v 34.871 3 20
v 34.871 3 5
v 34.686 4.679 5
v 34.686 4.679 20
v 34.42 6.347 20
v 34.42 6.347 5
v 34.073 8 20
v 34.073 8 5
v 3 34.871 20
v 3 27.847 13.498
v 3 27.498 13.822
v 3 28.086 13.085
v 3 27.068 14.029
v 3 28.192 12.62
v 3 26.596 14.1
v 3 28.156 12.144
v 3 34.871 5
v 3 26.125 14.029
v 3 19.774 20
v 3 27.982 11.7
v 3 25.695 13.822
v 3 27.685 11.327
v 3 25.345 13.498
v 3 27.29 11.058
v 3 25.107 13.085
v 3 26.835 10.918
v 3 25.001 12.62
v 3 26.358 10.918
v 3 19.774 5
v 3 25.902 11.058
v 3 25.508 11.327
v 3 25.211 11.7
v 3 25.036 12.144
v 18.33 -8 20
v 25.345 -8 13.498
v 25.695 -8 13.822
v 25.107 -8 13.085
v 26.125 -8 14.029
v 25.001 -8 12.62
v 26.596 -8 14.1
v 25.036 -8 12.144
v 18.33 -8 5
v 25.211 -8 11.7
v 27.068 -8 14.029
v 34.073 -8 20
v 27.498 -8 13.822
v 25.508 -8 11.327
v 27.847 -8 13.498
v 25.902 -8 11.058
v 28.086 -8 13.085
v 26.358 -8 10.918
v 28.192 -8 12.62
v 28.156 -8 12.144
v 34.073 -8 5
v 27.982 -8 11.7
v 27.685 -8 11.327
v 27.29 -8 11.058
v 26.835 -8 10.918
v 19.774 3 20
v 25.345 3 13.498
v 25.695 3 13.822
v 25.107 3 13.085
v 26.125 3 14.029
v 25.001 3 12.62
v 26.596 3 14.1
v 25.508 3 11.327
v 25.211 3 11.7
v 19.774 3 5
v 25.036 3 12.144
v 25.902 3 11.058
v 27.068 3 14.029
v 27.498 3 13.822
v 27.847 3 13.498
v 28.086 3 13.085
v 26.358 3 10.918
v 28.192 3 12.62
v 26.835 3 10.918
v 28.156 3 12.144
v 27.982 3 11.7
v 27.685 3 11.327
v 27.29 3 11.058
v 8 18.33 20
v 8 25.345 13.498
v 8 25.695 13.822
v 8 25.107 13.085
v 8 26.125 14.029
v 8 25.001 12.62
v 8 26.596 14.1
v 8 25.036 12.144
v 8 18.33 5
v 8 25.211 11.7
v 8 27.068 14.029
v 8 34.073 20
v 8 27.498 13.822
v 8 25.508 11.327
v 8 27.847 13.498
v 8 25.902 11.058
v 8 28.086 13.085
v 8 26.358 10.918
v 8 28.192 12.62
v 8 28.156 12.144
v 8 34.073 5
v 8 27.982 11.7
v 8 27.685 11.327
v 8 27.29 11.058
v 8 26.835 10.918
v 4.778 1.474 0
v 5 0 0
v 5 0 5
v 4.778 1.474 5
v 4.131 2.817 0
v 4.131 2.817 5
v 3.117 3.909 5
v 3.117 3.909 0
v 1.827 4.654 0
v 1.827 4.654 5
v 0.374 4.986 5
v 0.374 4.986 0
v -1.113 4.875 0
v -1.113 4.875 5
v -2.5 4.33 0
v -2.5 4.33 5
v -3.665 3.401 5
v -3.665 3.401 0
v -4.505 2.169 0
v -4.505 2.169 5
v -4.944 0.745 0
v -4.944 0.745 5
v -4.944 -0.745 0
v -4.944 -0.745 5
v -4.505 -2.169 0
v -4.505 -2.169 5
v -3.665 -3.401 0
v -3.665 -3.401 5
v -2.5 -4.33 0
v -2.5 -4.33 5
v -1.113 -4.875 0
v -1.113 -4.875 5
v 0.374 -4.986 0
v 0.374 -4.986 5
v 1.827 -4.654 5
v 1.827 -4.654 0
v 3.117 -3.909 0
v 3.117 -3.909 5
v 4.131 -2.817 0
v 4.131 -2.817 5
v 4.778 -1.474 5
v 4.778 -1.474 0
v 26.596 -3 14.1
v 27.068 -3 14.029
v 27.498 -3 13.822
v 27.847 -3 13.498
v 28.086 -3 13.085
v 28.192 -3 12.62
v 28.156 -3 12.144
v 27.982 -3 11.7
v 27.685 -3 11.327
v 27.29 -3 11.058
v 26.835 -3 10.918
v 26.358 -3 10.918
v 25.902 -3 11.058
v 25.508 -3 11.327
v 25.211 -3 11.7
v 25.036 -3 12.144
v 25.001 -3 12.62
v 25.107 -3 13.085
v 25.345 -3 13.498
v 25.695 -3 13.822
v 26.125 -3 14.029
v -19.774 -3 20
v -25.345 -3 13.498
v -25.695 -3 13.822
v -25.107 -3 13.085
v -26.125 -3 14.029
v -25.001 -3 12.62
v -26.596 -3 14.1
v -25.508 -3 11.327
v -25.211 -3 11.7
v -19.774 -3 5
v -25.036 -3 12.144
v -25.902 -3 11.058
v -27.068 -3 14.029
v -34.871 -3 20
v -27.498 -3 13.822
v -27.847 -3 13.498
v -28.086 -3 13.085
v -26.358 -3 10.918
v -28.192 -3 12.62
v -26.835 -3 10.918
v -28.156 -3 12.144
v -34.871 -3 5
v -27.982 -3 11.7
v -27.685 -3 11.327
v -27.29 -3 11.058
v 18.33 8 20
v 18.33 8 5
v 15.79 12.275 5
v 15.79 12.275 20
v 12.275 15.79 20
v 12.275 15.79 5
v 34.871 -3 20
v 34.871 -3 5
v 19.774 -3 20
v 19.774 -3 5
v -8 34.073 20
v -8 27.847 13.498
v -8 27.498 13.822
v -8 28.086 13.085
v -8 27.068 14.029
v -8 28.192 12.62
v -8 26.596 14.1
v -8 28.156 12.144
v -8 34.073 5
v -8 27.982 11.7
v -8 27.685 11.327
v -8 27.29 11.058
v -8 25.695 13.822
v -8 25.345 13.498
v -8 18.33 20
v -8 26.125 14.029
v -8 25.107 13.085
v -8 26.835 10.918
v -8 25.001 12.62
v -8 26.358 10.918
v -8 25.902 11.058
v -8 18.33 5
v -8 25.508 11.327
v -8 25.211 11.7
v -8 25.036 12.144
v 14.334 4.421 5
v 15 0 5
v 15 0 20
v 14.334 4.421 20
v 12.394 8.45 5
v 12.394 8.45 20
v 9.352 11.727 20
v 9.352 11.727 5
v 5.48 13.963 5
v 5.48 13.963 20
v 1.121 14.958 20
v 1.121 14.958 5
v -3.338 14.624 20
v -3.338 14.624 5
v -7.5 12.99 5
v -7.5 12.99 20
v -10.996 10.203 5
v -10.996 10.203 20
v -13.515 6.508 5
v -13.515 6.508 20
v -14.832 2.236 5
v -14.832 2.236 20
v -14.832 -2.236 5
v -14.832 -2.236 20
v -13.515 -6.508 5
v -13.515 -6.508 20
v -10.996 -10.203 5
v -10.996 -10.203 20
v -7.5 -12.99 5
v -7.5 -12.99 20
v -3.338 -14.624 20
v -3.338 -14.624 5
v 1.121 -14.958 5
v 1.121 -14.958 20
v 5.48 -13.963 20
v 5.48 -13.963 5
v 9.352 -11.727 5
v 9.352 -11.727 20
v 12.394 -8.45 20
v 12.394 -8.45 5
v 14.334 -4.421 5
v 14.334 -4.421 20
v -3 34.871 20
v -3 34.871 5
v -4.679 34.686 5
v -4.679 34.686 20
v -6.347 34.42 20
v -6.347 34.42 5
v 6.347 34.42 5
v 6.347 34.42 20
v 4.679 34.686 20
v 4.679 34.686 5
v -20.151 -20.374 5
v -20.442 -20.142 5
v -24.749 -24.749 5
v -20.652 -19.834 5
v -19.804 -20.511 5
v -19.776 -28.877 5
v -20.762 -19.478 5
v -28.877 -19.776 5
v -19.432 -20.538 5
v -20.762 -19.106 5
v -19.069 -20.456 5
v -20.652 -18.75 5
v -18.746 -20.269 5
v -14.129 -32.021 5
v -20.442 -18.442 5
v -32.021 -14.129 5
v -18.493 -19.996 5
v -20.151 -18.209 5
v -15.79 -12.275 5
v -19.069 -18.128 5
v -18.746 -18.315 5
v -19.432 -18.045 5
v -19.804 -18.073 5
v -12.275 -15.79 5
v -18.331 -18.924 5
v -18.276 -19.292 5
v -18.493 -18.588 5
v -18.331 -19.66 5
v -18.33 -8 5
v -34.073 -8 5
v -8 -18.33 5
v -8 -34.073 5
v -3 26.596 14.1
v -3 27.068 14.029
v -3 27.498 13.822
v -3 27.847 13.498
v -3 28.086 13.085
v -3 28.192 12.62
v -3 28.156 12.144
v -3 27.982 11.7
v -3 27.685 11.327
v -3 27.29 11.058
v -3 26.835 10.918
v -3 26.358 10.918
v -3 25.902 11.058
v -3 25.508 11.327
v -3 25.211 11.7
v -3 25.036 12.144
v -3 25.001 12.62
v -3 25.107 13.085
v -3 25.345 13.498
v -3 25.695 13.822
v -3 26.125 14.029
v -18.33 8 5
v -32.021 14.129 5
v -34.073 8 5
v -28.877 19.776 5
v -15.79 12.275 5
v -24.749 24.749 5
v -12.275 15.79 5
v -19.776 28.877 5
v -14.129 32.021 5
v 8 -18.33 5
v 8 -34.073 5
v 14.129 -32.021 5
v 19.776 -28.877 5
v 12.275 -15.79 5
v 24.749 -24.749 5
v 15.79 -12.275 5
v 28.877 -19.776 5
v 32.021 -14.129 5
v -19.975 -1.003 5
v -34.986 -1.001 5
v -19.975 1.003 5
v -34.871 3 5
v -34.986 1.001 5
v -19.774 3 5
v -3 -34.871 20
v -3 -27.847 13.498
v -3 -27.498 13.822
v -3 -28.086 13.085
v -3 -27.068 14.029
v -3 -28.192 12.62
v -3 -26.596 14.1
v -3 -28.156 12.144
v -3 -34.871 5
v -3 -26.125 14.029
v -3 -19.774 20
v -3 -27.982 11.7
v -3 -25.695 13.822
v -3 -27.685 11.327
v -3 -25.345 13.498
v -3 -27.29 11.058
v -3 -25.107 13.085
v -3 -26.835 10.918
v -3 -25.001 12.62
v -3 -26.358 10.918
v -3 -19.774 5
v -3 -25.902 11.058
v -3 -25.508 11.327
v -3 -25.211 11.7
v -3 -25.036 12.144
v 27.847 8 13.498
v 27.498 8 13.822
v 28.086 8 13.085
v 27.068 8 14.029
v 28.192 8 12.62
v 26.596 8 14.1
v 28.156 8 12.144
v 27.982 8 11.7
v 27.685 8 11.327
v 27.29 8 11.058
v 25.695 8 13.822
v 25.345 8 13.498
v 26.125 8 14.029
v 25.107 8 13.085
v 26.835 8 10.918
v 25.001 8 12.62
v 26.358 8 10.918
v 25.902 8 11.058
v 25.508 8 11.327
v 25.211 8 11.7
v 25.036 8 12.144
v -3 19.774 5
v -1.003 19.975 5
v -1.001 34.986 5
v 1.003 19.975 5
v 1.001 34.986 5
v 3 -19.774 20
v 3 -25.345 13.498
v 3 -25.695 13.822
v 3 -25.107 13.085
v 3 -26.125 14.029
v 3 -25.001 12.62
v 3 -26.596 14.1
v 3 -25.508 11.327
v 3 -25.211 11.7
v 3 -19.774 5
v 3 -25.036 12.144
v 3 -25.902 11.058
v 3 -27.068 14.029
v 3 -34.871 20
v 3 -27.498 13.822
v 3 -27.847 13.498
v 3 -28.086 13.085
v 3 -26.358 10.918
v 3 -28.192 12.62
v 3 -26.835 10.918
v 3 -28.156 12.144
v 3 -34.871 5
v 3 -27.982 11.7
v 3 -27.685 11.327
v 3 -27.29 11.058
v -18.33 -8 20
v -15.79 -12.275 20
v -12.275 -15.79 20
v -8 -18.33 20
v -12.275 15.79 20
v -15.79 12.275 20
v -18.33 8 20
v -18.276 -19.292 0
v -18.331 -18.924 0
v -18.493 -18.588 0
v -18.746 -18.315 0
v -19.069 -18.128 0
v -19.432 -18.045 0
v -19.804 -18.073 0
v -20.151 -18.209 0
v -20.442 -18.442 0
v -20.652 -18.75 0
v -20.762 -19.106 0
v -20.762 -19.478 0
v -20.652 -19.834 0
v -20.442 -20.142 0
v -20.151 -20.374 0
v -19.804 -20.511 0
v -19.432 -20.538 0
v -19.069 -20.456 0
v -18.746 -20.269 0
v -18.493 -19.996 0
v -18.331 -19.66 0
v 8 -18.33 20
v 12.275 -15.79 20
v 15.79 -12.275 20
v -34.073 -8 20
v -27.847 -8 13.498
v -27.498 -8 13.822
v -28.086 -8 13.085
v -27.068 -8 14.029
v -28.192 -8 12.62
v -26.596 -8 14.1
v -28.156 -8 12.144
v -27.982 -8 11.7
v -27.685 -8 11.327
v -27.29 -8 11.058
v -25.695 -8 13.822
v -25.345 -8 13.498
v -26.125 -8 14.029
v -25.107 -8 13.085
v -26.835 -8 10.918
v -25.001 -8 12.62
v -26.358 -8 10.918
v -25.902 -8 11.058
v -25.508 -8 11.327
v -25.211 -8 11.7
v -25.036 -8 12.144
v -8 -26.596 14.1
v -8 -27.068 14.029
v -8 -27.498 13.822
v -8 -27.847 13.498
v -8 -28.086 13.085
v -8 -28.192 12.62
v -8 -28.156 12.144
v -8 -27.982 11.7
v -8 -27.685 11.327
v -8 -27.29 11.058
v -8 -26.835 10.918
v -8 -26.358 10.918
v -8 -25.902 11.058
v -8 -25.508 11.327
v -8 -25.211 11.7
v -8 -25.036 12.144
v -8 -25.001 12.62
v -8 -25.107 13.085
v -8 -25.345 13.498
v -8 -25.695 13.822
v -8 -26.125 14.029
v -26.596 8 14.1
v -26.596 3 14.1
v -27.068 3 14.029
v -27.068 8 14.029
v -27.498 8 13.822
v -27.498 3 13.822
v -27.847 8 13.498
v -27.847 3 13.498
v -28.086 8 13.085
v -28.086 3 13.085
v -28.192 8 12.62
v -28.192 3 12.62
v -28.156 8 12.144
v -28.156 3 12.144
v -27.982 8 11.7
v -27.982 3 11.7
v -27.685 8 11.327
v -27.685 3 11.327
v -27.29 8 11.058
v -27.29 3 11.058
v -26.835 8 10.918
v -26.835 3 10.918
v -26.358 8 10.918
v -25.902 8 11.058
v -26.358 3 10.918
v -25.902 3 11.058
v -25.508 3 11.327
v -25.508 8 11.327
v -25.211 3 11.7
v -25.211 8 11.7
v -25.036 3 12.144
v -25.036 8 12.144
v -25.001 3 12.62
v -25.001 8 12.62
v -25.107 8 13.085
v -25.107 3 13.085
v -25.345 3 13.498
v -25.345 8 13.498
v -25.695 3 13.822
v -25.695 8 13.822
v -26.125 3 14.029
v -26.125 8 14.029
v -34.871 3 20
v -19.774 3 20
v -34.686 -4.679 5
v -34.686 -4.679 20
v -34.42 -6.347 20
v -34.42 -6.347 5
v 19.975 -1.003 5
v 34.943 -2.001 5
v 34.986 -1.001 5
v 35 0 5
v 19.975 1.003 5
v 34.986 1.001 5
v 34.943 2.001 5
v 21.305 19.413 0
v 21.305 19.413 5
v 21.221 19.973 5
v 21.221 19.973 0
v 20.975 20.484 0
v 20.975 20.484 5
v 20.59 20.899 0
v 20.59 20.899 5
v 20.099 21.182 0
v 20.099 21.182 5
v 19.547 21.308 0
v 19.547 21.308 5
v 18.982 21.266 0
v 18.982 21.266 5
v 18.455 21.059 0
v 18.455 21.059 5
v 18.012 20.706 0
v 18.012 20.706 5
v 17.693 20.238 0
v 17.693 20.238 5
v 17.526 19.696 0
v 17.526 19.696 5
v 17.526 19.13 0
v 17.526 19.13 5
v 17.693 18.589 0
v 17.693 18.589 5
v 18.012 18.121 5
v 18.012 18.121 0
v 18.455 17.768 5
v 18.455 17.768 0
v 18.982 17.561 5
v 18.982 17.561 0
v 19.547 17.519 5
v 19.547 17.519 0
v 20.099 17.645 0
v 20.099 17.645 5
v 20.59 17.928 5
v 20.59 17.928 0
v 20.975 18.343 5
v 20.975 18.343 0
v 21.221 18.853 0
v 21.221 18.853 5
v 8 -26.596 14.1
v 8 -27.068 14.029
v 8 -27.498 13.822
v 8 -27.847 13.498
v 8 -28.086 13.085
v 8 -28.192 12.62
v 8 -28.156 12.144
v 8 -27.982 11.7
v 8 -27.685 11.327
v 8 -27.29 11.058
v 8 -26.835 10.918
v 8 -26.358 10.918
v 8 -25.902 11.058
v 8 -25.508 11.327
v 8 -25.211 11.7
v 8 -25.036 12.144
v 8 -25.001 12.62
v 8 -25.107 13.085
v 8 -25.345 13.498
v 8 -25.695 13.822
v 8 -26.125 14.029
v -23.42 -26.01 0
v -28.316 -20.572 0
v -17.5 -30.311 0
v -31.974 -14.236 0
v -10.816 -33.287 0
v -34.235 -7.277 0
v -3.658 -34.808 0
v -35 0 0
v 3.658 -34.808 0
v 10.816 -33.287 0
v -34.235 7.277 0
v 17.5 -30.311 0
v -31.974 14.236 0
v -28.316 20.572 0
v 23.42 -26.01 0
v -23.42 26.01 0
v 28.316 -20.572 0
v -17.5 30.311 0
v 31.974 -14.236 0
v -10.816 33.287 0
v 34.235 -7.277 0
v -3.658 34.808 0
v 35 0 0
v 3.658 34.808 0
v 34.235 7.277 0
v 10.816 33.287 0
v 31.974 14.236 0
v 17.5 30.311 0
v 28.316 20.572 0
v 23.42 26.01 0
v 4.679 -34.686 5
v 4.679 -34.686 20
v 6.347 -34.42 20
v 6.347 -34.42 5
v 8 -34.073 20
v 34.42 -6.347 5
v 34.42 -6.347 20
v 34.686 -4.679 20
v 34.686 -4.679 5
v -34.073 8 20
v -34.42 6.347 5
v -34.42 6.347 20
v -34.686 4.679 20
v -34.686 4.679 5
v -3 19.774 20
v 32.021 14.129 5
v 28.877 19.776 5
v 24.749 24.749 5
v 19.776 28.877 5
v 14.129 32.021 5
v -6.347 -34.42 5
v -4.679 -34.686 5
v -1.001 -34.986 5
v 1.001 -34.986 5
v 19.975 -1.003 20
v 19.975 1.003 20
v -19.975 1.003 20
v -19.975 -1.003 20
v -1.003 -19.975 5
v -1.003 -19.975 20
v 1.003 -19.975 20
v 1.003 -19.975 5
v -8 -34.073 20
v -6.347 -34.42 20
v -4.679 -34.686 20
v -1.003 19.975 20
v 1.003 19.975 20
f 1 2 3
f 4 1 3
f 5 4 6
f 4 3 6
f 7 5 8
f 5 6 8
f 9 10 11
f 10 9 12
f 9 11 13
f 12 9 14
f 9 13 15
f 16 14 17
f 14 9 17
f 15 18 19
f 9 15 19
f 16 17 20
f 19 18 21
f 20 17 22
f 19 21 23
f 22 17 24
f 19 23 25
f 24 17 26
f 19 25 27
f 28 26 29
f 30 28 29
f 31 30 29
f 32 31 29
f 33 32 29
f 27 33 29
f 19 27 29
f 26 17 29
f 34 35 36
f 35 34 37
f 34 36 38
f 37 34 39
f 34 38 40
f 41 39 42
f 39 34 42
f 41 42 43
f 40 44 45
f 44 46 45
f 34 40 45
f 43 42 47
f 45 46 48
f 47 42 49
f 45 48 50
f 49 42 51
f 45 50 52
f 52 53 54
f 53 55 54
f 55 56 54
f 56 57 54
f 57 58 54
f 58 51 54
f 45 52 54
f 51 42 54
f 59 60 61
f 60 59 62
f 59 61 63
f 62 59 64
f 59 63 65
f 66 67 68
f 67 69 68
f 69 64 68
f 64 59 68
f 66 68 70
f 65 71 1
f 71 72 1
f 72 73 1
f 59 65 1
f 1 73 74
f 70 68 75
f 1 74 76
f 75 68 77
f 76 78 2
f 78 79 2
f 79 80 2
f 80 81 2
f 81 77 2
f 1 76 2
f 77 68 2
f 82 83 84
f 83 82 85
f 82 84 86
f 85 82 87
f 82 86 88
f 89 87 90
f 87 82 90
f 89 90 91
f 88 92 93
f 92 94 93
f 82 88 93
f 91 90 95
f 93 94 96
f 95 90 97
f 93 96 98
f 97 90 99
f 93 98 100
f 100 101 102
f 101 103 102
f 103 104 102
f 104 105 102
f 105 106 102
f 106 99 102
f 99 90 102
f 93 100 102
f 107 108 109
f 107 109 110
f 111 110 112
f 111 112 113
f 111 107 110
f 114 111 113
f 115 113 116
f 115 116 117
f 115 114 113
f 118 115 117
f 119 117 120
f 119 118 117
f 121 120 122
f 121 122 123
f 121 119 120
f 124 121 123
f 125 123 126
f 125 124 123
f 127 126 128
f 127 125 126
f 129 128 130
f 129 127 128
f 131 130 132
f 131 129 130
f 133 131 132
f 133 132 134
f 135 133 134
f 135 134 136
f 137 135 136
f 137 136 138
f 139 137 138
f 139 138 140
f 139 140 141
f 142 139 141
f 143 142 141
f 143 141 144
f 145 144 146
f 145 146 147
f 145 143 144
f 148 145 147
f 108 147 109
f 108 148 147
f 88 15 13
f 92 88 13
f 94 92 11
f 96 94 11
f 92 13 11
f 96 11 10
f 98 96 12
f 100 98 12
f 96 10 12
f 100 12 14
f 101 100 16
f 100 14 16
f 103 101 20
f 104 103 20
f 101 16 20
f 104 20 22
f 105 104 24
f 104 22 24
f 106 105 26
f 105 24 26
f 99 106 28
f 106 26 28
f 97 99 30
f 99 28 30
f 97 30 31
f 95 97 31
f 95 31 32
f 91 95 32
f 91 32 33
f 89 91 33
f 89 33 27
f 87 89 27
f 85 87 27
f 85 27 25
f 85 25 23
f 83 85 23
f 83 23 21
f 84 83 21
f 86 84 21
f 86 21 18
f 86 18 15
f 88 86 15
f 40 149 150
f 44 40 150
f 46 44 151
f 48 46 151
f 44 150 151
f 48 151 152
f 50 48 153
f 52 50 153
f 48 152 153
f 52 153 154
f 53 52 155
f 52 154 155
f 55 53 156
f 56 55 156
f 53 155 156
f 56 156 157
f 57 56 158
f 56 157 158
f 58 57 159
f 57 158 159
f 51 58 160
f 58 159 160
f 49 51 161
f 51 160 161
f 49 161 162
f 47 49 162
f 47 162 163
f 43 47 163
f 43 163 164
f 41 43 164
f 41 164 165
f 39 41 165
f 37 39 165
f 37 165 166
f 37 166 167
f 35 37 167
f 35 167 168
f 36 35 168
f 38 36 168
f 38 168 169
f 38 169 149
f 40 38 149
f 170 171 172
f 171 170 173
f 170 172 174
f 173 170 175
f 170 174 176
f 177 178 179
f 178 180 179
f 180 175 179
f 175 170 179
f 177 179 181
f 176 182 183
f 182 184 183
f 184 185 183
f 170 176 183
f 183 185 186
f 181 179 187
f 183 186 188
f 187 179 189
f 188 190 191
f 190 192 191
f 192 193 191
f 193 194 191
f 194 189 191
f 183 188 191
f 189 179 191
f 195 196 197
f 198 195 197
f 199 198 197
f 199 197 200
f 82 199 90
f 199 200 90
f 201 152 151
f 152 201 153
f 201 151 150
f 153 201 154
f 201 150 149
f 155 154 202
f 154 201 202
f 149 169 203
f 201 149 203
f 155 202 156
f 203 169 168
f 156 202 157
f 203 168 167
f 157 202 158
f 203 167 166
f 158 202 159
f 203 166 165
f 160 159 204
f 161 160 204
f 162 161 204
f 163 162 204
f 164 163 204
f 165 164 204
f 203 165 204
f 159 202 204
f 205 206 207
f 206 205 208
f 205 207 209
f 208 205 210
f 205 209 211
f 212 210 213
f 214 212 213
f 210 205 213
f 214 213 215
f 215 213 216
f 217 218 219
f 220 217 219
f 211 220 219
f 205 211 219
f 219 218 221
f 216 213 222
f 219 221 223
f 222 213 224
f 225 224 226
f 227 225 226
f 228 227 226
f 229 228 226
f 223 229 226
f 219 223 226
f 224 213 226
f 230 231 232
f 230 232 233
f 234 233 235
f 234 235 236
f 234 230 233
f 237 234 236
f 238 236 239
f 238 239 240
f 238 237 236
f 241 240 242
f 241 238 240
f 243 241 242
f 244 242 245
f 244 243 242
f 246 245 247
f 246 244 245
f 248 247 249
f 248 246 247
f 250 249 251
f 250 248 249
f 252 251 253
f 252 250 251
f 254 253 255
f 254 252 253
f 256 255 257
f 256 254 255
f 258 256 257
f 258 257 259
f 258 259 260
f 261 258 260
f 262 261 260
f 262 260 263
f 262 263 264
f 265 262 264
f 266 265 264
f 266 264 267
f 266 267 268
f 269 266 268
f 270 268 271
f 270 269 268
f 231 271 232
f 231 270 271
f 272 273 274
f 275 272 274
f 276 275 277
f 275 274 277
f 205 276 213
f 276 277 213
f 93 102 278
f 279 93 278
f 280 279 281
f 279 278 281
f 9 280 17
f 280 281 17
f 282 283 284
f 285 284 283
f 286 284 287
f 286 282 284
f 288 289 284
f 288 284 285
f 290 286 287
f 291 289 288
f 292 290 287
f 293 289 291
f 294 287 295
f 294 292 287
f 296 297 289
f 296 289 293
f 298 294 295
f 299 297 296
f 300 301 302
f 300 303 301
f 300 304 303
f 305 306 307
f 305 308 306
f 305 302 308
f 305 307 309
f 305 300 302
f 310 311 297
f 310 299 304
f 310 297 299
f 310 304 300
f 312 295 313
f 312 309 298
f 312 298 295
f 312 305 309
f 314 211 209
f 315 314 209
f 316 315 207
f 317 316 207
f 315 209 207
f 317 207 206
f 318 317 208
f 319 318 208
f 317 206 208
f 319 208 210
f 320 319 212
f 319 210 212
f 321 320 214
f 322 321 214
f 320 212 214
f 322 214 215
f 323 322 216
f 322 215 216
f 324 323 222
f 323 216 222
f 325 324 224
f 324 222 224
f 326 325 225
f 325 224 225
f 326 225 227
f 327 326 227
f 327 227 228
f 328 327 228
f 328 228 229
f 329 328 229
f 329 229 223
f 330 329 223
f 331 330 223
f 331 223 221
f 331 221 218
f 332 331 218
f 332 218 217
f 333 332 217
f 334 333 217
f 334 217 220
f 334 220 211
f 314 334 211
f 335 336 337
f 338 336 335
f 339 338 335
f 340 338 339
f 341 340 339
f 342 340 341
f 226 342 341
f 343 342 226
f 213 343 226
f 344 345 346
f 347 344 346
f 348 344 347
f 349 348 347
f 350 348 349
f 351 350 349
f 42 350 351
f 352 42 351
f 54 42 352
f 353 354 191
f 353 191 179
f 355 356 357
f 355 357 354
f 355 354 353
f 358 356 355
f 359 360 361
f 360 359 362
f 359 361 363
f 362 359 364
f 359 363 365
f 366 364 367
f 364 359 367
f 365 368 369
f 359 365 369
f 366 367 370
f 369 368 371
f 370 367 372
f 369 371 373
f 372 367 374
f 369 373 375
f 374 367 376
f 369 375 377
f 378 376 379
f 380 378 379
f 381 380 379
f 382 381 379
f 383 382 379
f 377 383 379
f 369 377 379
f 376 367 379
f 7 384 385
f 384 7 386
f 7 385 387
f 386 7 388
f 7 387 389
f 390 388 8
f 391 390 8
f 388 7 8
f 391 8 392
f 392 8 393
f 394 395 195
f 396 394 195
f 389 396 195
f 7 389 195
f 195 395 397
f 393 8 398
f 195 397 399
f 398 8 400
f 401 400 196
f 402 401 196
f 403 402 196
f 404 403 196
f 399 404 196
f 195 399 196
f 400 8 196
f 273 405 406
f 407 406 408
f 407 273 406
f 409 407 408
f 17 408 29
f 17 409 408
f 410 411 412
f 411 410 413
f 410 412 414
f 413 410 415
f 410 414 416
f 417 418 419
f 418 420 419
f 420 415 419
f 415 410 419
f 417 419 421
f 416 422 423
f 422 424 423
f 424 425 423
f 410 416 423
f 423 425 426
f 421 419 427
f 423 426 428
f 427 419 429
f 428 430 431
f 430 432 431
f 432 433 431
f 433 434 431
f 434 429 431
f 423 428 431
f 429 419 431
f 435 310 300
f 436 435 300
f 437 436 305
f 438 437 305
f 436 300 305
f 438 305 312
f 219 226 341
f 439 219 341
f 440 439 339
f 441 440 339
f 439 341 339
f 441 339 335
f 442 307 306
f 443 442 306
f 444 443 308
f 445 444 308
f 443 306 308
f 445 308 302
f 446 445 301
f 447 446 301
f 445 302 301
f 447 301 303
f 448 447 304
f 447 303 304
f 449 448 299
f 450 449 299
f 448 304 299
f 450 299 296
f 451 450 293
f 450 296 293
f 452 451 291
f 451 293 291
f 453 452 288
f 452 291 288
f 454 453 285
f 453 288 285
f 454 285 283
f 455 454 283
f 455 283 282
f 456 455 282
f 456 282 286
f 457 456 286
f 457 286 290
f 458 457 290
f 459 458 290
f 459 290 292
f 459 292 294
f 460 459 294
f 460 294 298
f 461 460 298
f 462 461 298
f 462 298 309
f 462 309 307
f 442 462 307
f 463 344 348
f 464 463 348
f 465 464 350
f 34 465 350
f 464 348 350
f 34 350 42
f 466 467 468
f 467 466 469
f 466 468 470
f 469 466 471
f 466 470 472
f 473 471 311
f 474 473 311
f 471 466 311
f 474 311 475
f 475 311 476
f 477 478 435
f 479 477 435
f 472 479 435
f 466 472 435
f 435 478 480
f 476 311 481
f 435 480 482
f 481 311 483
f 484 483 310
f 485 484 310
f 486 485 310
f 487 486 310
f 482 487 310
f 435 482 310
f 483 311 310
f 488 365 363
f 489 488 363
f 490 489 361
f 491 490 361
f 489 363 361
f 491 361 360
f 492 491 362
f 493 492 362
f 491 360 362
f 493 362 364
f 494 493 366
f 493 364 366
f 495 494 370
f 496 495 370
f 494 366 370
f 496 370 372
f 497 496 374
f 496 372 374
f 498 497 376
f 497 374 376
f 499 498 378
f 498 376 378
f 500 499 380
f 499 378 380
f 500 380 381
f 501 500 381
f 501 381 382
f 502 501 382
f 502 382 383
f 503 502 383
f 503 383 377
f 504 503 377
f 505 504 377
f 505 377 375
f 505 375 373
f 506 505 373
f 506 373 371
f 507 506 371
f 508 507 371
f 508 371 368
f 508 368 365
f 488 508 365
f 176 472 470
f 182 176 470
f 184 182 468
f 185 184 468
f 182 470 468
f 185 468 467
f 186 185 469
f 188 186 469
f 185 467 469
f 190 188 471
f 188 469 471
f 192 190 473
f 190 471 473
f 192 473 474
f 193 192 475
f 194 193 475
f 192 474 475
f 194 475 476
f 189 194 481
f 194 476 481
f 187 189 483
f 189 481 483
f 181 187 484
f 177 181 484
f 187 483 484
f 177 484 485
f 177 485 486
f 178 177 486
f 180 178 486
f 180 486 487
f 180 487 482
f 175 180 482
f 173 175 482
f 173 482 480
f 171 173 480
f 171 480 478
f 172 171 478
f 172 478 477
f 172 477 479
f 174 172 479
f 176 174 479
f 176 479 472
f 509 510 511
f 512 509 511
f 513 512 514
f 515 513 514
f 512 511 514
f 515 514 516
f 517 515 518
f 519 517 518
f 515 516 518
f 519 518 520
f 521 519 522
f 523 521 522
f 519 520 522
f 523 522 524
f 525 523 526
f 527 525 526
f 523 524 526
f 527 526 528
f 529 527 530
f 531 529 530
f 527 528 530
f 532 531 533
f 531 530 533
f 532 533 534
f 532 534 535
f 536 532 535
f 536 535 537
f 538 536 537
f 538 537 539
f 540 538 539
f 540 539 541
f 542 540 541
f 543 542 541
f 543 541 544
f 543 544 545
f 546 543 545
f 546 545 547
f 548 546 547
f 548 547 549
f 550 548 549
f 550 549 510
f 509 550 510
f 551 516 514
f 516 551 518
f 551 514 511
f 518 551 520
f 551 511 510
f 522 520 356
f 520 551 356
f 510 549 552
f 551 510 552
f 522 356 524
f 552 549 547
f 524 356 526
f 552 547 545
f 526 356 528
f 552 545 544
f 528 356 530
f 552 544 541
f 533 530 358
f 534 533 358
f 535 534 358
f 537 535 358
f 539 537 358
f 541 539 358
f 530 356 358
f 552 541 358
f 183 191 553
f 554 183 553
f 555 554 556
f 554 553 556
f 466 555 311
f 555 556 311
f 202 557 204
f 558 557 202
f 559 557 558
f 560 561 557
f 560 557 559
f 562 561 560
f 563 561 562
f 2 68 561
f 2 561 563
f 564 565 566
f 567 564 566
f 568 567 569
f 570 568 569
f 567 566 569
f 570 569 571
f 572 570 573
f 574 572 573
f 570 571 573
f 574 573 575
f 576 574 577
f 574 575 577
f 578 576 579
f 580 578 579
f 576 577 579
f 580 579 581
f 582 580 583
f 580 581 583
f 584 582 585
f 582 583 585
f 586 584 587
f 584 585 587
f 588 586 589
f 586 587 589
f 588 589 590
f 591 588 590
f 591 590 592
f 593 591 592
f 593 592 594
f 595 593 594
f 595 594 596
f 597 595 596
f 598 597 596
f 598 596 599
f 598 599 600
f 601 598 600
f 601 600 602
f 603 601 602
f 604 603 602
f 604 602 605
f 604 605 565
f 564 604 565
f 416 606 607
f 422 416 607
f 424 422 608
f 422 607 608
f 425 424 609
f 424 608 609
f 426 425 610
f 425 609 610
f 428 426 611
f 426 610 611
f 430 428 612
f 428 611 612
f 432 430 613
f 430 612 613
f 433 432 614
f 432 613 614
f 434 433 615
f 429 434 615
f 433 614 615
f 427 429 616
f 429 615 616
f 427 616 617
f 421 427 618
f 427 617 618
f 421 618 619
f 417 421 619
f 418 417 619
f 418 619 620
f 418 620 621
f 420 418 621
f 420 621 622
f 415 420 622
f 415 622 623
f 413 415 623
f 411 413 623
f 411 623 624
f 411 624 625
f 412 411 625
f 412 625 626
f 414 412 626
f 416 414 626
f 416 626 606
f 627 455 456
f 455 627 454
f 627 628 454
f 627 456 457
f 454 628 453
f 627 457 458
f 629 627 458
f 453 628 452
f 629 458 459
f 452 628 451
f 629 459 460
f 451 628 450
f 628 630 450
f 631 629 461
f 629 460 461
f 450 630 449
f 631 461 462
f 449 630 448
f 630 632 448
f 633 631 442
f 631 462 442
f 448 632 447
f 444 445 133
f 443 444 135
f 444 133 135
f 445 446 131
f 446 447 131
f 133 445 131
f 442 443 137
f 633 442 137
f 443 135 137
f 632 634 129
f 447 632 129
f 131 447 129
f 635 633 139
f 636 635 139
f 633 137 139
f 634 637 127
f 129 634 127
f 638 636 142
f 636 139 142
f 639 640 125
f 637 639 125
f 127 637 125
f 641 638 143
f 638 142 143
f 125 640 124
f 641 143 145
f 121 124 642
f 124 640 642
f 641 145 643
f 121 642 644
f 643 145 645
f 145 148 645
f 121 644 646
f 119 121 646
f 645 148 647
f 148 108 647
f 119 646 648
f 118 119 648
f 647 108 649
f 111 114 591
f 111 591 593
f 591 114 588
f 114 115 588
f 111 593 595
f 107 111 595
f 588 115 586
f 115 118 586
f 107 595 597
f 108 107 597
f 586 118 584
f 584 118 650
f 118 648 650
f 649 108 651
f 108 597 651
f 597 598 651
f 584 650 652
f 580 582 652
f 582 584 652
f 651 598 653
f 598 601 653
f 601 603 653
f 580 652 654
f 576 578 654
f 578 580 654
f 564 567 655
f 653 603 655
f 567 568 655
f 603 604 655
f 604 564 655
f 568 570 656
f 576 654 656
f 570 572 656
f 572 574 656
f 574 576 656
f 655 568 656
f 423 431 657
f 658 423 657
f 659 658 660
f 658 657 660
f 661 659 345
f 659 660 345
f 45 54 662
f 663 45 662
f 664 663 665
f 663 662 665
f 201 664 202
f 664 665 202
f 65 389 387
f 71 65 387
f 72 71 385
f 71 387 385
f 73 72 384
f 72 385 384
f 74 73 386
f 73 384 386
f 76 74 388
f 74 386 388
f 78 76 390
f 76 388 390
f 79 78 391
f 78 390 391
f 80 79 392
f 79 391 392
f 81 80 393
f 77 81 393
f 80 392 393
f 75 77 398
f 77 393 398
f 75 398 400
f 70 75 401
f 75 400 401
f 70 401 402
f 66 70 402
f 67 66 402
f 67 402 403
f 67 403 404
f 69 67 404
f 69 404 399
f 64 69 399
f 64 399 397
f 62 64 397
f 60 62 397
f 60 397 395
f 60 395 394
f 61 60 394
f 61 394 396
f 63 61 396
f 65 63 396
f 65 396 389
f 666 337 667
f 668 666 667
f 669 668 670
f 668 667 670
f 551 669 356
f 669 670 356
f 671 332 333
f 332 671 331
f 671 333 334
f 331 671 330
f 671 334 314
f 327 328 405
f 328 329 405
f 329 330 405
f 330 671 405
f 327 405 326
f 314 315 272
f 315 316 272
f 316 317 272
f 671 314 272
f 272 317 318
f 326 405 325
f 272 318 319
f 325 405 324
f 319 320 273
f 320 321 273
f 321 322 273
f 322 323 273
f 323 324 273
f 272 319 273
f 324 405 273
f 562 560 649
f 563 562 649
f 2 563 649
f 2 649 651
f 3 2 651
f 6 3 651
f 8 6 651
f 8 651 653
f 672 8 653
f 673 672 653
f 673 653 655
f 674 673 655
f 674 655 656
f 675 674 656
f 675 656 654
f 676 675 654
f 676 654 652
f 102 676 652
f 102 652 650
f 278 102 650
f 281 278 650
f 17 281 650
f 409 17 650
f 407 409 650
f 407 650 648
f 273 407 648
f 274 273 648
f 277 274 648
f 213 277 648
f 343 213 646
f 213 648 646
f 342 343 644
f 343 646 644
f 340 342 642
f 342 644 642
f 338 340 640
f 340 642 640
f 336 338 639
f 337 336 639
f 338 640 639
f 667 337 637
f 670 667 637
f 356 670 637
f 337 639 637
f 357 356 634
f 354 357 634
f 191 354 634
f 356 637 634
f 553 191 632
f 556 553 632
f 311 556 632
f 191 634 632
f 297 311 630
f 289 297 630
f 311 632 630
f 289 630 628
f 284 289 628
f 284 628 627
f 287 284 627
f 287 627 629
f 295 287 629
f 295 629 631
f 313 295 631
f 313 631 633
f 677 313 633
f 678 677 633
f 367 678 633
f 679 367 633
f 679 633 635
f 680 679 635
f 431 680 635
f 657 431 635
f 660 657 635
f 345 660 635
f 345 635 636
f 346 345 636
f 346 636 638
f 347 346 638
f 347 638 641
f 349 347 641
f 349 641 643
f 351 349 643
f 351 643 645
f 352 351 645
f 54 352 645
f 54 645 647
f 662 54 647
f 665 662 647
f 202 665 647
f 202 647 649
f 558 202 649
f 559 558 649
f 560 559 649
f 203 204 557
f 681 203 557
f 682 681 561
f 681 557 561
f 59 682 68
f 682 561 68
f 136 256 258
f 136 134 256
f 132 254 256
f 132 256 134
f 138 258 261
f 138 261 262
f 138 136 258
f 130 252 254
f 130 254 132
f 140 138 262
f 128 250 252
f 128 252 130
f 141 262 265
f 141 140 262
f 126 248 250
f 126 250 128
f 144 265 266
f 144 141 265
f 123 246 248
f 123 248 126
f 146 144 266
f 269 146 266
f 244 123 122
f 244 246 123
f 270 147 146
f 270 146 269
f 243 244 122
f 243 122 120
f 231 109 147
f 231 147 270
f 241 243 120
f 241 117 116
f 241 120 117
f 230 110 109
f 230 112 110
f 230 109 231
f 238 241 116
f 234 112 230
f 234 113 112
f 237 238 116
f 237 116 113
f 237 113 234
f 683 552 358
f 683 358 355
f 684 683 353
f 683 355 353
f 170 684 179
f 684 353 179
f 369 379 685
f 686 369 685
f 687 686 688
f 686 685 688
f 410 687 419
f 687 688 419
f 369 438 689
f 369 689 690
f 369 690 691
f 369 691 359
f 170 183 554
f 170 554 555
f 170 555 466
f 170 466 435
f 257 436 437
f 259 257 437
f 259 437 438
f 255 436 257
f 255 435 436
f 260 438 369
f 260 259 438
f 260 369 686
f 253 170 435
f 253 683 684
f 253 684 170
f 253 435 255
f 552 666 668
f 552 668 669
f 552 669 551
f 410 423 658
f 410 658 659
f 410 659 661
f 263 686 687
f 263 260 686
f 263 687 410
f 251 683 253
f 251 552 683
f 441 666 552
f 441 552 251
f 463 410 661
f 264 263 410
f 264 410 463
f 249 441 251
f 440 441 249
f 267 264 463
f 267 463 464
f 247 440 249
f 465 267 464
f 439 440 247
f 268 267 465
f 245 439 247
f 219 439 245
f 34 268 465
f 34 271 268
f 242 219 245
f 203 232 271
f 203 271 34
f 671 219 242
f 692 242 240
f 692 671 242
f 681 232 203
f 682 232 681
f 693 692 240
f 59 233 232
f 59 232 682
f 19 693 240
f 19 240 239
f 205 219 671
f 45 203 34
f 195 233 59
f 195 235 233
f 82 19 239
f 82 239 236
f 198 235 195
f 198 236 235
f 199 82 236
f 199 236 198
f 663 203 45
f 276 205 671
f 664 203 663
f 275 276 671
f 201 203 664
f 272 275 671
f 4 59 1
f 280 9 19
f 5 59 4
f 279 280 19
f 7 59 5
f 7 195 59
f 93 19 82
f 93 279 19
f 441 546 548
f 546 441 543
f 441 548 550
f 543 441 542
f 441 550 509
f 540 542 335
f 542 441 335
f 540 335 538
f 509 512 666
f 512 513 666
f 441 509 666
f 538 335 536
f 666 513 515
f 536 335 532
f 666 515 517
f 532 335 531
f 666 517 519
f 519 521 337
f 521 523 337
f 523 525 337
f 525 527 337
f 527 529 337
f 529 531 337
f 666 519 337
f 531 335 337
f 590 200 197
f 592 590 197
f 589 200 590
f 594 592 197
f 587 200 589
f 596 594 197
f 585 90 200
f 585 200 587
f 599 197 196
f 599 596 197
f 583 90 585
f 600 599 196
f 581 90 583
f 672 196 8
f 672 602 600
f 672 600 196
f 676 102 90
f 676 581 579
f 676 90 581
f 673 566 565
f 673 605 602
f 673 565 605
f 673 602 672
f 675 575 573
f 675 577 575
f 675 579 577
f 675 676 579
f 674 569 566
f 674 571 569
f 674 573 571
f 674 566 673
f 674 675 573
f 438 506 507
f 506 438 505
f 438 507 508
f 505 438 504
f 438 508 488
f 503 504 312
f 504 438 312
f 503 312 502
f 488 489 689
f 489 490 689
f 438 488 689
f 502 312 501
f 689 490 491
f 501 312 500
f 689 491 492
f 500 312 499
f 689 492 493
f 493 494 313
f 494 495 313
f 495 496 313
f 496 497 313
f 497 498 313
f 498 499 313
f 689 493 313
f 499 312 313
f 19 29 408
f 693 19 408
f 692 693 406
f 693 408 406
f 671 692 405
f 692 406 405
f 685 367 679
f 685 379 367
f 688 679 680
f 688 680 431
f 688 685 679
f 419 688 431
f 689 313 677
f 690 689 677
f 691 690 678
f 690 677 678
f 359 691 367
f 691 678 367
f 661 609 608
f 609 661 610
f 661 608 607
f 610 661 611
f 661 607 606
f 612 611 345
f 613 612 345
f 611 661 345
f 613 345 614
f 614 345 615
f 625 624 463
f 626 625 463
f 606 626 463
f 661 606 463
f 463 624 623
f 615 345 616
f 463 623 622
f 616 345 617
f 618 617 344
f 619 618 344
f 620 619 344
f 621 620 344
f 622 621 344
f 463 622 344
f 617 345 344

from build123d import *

# Parameters (mm, degrees)
SKETCH2_R           = 35
SKETCH2_R_2         = 5
BOSS_EXTRUDE1_DEPTH = 5
SKETCH3_R           = 20
SKETCH3_R_2         = 15
BOSS_EXTRUDE3_DEPTH = 15
SKETCH4_R           = 1.6
CUT_EXTRUDE1_DEPTH  = 59.940648113
CIRPATTERN1_COUNT   = 4
SKETCH5_R           = 1.9
SKETCH5_R_2         = 1.25
CUT_EXTRUDE2_DEPTH  = 52.720402164


with BuildPart() as part:
    # Sketch2 → Boss-Extrude1 (new body)
    with BuildSketch(Plane.XY):
        Circle(SKETCH2_R)
        Circle(SKETCH2_R_2, mode=Mode.SUBTRACT)
    extrude(amount=BOSS_EXTRUDE1_DEPTH)

    # Sketch3 → Boss-Extrude3 (add)
    # profile 1 of 9: a face of its own
    with BuildSketch(Plane.XY.offset(5)):
        with BuildLine():
            ThreePointArc((-3, -19.773719933), (-5.547149112, -19.215335978), (-8, -18.33030278))
            Line((-8, -18.33030278), (-8, -34.073450075))
            ThreePointArc((-8, -34.073450075), (-5.514444475, -34.562854369), (-3, -34.871191548))
            Line((-3, -34.871191548), (-3, -19.773719933))
        make_face()
    # profile 2 of 9: a face of its own
    with BuildSketch(Plane.XY.offset(5)):
        with BuildLine():
            Line((8, -34.073450075), (8, -18.33030278))
            ThreePointArc((8, -18.33030278), (5.547149112, -19.215335978), (3, -19.773719933))
            Line((3, -19.773719933), (3, -34.871191548))
            ThreePointArc((3, -34.871191548), (5.514444475, -34.562854369), (8, -34.073450075))
        make_face()
    # profile 3 of 9: a face of its own
    with BuildSketch(Plane.XY.offset(5)):
        with BuildLine():
            Line((34.871191548, -3), (19.773719933, -3))
            ThreePointArc((19.773719933, -3), (19.215335978, -5.547149112), (18.33030278, -8))
            Line((18.33030278, -8), (34.073450075, -8))
            ThreePointArc((34.073450075, -8), (34.562854369, -5.514444475), (34.871191548, -3))
        make_face()
    # profile 4 of 9: a face of its own
    with BuildSketch(Plane.XY.offset(5)):
        with BuildLine():
            Line((34.073450075, 8), (18.33030278, 8))
            ThreePointArc((18.33030278, 8), (19.215335978, 5.547149112), (19.773719933, 3))
            Line((19.773719933, 3), (34.871191548, 3))
            ThreePointArc((34.871191548, 3), (34.562854369, 5.514444475), (34.073450075, 8))
        make_face()
    # profile 5 of 9: a face of its own
    with BuildSketch(Plane.XY.offset(5)):
        with BuildLine():
            Line((3, 34.871191548), (3, 19.773719933))
            ThreePointArc((3, 19.773719933), (5.547149112, 19.215335978), (8, 18.33030278))
            Line((8, 18.33030278), (8, 34.073450075))
            ThreePointArc((8, 34.073450075), (5.514444475, 34.562854369), (3, 34.871191548))
        make_face()
    # profile 6 of 9: a face of its own
    with BuildSketch(Plane.XY.offset(5)):
        with BuildLine():
            ThreePointArc((-8, 18.33030278), (-5.547149112, 19.215335978), (-3, 19.773719933))
            Line((-3, 19.773719933), (-3, 34.871191548))
            ThreePointArc((-3, 34.871191548), (-5.514444475, 34.562854369), (-8, 34.073450075))
            Line((-8, 34.073450075), (-8, 18.33030278))
        make_face()
    # profile 7 of 9: a face of its own
    with BuildSketch(Plane.XY.offset(5)):
        with BuildLine():
            ThreePointArc((-19.773719933, 3), (-19.215335978, 5.547149112), (-18.33030278, 8))
            Line((-18.33030278, 8), (-34.073450075, 8))
            ThreePointArc((-34.073450075, 8), (-34.562854369, 5.514444475), (-34.871191548, 3))
            Line((-34.871191548, 3), (-19.773719933, 3))
        make_face()
    # profile 8 of 9: a face of its own
    with BuildSketch(Plane.XY.offset(5)):
        with BuildLine():
            ThreePointArc((-18.33030278, -8), (-19.215335978, -5.547149112), (-19.773719933, -3))
            Line((-19.773719933, -3), (-34.871191548, -3))
            ThreePointArc((-34.871191548, -3), (-34.562854369, -5.514444475), (-34.073450075, -8))
            Line((-34.073450075, -8), (-18.33030278, -8))
        make_face()
    # profile 9 of 9: a face of its own
    with BuildSketch(Plane.XY.offset(5)):
        Circle(SKETCH3_R)
        Circle(SKETCH3_R_2, mode=Mode.SUBTRACT)
    extrude(amount=BOSS_EXTRUDE3_DEPTH)

    # Sketch4 → Cut-Extrude1 (cut, through all)
    with BuildSketch(Plane.ZY.offset(8)):
        with Locations((12.5, 26.596250524)):
            Circle(SKETCH4_R)
    cut_extrude1 = extrude(amount=-CUT_EXTRUDE1_DEPTH, mode=Mode.SUBTRACT)

    # CirPattern1: Cut-Extrude1 ×4 about axis
    cirpattern1_axis = Axis((0, 0, 20), (0, 0, -1))
    for i in range(1, CIRPATTERN1_COUNT):
        add(cut_extrude1.rotate(cirpattern1_axis, i * 360 / CIRPATTERN1_COUNT), mode=Mode.SUBTRACT)

    # Sketch5 → Cut-Extrude2 (cut, through all)
    with BuildSketch(Plane.XY.offset(5)):
        with Locations((19.405170255, 19.413249431)):
            Circle(SKETCH5_R)
        with Locations((-19.525765468, -19.291950885)):
            Circle(SKETCH5_R_2)
    extrude(amount=-CUT_EXTRUDE2_DEPTH, mode=Mode.SUBTRACT)


solid = part.part
